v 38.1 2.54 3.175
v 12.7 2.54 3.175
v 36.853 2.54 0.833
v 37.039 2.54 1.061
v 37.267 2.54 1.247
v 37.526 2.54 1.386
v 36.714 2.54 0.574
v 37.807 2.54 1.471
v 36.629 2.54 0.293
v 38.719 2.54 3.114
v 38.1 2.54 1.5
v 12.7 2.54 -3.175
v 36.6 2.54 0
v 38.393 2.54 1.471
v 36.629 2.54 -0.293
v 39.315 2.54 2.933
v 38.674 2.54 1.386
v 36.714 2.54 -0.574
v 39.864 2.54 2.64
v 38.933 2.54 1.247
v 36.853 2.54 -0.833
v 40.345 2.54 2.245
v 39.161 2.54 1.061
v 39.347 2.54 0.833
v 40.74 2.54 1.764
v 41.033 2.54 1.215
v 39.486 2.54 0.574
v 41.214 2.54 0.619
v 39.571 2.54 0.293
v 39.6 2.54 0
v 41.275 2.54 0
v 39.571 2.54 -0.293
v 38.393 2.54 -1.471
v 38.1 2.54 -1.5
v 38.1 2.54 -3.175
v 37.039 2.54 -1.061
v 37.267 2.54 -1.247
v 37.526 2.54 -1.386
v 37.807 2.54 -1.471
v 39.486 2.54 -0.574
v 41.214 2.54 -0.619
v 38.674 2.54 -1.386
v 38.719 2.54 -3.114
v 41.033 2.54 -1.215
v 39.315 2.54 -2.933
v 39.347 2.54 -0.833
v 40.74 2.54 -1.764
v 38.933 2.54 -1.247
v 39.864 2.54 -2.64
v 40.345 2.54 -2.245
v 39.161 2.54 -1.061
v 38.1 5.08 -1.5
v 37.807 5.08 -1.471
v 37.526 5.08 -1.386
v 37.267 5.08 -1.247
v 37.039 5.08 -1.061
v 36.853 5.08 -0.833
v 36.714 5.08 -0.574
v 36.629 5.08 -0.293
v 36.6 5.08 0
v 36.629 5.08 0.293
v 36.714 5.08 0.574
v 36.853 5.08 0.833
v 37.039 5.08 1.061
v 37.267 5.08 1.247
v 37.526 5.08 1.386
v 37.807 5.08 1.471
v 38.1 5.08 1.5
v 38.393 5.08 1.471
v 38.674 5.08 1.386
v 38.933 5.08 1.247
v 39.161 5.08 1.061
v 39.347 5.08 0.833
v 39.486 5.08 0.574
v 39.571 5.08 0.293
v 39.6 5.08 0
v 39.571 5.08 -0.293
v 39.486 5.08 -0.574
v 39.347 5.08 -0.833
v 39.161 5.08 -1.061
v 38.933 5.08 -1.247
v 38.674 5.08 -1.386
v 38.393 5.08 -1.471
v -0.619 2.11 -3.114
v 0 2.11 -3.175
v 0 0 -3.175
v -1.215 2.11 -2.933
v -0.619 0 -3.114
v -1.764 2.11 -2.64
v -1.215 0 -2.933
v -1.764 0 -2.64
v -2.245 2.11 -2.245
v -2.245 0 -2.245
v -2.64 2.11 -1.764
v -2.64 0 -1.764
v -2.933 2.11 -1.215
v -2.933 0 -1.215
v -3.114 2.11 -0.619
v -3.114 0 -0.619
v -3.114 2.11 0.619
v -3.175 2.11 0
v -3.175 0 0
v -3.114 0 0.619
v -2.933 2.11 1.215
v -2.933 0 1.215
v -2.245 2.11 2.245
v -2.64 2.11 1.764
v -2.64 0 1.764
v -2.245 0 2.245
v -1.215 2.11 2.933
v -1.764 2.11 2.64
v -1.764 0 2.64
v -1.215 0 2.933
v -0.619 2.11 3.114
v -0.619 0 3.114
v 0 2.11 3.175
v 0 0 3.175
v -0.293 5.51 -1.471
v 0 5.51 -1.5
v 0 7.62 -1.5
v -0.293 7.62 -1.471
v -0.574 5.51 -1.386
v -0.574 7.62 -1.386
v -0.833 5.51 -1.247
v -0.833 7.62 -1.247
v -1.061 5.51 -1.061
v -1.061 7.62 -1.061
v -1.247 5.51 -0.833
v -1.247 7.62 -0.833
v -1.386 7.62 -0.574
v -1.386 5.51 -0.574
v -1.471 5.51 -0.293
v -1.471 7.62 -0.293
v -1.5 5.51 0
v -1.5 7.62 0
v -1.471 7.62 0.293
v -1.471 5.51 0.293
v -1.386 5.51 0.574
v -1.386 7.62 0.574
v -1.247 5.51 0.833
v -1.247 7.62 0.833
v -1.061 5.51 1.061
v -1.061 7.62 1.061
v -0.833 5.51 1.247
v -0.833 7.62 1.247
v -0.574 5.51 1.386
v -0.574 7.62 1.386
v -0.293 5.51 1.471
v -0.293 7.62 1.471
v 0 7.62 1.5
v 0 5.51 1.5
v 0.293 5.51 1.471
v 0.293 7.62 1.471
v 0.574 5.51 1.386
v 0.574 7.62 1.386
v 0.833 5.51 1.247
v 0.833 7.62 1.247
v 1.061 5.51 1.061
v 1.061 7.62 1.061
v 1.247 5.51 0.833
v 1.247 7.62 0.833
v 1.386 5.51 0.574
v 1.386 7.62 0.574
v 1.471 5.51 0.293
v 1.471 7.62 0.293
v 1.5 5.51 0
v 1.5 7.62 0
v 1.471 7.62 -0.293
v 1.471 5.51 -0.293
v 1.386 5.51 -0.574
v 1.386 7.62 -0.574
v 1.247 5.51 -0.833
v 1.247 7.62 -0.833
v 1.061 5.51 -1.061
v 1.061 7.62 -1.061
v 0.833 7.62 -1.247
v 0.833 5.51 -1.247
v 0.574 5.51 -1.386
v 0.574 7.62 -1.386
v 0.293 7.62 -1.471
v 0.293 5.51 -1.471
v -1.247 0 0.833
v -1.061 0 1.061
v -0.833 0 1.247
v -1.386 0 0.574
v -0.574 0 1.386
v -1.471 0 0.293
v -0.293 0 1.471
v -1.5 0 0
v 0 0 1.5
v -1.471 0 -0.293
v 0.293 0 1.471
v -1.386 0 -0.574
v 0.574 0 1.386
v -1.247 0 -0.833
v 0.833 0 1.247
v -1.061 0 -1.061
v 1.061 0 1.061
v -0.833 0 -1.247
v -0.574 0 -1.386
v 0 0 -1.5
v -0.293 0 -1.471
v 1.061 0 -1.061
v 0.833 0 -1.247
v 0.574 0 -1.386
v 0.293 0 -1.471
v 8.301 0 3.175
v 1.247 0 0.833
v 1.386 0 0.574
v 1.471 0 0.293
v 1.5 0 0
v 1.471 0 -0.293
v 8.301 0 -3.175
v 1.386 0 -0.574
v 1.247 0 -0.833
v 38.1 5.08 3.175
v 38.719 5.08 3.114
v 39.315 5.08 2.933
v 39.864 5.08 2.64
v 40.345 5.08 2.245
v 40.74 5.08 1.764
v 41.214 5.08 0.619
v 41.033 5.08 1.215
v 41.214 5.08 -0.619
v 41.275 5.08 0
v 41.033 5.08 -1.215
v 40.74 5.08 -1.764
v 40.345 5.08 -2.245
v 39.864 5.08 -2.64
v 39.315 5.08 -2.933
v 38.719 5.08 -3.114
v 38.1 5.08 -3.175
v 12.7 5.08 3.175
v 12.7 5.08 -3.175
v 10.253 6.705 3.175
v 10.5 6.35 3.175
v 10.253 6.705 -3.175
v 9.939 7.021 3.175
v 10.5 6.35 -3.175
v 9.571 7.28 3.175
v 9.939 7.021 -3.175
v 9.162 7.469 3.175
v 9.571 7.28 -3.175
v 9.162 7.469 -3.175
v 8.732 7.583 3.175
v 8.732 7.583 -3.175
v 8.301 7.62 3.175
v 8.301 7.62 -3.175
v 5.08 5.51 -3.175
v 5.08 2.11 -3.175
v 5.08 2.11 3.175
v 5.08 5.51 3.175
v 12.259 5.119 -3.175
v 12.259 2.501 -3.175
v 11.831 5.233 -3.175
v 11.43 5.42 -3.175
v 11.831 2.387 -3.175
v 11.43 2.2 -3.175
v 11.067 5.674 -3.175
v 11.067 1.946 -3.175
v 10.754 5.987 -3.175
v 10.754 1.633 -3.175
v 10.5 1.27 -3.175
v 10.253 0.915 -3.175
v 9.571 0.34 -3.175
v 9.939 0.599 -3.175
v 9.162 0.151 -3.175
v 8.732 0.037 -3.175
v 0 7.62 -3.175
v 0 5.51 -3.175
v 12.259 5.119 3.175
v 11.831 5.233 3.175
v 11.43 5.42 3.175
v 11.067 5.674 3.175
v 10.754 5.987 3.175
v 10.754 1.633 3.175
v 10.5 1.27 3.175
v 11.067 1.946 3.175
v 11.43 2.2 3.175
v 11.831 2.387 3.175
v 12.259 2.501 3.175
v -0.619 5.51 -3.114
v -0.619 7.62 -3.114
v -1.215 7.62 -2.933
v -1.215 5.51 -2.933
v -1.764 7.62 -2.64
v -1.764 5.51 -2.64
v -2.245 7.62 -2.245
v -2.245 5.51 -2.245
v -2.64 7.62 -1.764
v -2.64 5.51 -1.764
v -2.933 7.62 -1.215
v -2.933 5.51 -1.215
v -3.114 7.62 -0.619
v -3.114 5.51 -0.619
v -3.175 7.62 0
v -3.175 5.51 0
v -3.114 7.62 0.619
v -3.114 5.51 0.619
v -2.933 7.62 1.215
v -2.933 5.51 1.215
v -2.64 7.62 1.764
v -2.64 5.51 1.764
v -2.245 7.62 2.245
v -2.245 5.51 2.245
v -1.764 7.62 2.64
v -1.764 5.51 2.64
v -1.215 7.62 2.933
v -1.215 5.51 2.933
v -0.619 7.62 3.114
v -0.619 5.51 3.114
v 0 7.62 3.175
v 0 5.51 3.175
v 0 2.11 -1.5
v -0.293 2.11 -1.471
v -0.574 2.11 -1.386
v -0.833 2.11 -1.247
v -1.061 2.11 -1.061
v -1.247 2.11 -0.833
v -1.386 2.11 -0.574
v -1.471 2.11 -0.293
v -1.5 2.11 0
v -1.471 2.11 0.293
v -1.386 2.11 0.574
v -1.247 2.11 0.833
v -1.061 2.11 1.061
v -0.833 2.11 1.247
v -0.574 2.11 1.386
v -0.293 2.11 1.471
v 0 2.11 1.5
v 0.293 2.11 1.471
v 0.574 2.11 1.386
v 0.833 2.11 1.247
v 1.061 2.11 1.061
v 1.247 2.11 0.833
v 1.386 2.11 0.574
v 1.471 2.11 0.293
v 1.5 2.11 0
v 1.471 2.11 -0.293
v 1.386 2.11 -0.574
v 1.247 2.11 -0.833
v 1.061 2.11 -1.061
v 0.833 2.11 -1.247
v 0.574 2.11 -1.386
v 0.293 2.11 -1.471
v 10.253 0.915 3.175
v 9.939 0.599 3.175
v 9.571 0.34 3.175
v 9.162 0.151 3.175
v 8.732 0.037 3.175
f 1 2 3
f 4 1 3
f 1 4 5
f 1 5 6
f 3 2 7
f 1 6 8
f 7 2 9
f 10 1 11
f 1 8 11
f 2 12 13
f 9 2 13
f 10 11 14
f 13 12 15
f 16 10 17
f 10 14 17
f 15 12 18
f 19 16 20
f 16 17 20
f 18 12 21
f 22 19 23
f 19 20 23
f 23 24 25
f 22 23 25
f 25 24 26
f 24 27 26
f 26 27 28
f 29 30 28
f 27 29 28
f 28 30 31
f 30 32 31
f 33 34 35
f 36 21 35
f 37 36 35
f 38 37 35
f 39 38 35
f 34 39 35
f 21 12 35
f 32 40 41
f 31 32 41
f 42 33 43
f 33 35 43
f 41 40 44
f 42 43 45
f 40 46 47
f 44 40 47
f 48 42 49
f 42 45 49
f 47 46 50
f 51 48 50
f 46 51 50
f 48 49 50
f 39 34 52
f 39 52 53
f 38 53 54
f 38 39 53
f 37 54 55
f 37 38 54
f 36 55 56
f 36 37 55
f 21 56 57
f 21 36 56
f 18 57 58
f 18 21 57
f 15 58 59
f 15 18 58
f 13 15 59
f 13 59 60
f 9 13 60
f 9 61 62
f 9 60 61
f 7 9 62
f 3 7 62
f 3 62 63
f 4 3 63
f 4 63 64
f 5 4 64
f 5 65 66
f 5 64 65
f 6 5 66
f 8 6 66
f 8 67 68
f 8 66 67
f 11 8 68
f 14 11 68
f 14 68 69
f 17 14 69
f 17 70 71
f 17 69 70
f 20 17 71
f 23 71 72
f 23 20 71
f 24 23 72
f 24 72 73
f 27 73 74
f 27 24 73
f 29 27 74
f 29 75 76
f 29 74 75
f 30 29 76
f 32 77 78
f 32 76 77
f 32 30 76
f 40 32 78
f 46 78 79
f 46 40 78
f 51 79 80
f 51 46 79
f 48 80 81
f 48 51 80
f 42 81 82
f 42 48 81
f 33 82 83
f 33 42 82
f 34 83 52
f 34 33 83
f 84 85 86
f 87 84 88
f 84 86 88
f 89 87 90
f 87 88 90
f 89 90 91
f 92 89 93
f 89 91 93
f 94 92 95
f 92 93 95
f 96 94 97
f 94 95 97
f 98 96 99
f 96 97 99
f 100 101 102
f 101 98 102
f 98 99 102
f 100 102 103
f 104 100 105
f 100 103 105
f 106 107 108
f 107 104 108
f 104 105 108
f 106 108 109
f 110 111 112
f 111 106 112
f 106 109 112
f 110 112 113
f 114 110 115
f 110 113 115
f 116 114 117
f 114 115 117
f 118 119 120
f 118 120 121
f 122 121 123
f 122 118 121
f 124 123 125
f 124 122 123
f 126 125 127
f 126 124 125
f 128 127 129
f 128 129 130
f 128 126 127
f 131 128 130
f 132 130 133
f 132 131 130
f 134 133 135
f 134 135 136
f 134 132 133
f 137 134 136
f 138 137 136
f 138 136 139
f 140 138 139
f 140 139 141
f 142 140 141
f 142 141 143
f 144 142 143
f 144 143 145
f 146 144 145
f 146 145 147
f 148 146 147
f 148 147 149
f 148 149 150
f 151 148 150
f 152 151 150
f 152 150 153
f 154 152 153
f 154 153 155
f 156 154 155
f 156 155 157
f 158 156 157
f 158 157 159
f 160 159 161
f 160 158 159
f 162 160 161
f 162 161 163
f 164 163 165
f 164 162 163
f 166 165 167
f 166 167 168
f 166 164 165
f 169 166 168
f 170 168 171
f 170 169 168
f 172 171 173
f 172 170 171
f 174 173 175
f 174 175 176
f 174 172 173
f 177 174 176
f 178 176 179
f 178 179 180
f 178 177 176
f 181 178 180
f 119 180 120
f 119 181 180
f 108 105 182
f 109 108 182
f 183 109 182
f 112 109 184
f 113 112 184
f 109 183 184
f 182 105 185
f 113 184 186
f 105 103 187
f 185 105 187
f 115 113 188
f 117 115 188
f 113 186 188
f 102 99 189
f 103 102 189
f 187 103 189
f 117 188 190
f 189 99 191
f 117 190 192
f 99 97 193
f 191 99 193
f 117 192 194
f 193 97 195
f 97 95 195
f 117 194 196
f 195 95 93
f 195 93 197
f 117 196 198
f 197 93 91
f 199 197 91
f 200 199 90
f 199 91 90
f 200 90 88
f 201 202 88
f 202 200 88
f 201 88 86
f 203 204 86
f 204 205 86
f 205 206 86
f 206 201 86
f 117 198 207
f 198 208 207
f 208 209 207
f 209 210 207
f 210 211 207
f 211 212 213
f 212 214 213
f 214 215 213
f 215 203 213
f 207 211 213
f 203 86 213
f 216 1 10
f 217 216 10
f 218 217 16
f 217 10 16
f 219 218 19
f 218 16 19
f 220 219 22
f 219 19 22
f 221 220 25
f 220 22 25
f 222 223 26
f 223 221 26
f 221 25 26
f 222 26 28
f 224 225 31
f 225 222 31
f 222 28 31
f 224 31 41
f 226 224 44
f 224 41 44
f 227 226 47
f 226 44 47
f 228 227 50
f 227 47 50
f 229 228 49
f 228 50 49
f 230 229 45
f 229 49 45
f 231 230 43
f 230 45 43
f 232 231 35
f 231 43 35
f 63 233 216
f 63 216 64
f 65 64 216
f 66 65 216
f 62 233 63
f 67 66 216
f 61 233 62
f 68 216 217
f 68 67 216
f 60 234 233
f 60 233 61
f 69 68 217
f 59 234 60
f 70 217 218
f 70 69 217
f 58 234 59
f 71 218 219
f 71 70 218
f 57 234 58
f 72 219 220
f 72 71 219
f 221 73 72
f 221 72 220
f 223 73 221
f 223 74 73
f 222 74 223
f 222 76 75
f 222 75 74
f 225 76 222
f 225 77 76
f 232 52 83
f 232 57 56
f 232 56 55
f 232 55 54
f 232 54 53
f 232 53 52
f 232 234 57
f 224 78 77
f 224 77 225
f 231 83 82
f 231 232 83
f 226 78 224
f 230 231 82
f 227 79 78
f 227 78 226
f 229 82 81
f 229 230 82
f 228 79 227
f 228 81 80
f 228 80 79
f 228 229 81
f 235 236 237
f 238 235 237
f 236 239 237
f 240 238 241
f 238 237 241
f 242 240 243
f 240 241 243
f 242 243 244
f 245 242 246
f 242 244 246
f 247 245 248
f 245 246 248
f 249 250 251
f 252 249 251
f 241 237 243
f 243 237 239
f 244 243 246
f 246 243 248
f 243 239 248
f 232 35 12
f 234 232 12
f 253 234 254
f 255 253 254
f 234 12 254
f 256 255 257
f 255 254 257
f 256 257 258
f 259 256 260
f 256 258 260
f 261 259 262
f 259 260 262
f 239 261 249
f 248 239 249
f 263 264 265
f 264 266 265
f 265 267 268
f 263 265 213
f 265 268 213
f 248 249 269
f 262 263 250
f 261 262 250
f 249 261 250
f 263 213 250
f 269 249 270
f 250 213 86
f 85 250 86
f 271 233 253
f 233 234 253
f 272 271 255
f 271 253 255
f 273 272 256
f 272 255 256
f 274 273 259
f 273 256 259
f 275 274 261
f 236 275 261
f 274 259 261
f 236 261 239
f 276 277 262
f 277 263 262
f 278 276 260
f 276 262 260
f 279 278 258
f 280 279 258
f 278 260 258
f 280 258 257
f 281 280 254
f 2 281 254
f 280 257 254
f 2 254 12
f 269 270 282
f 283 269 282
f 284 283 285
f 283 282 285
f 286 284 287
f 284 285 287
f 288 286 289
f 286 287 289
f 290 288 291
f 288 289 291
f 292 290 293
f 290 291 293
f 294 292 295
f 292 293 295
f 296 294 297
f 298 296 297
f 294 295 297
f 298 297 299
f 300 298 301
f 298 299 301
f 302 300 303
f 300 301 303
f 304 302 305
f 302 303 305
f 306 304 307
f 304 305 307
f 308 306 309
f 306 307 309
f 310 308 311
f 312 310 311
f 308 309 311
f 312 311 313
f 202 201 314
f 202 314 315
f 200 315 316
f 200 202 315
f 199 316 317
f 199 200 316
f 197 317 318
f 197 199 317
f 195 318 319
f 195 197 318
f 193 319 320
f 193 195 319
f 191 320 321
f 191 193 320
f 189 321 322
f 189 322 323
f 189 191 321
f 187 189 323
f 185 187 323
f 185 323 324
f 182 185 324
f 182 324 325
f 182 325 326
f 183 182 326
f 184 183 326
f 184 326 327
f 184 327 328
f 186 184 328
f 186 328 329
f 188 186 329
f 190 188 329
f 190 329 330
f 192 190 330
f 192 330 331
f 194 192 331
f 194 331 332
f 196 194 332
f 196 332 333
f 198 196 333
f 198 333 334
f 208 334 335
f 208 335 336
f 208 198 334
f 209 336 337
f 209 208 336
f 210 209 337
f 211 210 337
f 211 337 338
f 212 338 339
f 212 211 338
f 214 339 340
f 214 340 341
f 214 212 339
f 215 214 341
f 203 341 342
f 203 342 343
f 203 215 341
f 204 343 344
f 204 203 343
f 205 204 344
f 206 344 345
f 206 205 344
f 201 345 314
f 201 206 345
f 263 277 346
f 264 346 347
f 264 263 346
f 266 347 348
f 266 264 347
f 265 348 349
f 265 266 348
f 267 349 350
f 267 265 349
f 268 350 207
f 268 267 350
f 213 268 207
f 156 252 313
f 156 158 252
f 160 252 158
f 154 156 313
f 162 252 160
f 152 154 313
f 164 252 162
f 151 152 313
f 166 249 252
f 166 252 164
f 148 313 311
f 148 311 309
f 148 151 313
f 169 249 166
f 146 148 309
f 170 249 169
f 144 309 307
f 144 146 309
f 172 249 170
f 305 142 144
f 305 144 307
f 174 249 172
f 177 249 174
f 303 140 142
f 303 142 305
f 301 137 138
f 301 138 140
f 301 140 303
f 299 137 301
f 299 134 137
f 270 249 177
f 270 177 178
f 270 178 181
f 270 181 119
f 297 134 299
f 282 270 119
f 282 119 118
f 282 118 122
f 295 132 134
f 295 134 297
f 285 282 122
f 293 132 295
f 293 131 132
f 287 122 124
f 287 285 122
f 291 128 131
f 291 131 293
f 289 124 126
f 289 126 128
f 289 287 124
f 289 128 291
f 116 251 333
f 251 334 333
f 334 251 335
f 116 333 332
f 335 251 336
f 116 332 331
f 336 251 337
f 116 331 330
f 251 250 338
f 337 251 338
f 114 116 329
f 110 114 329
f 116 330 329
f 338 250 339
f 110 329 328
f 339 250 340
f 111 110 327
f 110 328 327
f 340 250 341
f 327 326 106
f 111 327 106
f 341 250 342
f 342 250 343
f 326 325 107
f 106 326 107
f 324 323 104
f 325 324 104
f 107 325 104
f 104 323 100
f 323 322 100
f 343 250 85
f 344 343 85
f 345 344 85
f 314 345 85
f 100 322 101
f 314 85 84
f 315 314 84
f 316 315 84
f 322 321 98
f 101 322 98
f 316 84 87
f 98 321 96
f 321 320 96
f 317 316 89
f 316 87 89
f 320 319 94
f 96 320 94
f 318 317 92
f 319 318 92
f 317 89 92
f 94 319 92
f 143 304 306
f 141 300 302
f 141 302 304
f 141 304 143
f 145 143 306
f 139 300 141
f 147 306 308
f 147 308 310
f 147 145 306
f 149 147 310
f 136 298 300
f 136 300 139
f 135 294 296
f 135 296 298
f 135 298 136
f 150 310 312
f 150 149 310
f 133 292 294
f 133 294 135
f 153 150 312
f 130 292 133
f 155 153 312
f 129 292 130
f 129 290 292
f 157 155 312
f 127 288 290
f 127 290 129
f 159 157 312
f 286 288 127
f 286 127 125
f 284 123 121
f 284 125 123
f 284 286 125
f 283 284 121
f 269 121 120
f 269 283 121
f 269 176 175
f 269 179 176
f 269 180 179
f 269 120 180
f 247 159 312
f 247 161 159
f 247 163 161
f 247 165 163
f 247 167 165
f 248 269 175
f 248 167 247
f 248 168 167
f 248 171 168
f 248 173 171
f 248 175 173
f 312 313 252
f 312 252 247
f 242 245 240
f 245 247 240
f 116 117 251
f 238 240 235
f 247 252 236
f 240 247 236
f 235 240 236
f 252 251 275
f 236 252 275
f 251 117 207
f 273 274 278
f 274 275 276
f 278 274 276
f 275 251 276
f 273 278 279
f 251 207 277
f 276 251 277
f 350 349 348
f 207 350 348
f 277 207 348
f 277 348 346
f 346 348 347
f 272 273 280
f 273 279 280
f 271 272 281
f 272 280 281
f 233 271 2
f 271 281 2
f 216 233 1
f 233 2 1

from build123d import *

# Parameters (mm, degrees)
SKETCH1_R               = 1.5
BOSS_EXTRUDE1_DEPTH     = 7.62
CUT_EXTRUDE1_DEPTH      = 1.7
CUT_EXTRUDE1_DEPTH_BACK = 1.7
SKETCH2_R               = 1.5
SKETCH3_W               = 34.821950375
SKETCH3_H               = 10.205546921
CUT_EXTRUDE2_DEPTH      = 2.54
FILLET1_R               = 2.54
FILLET2_R               = 2.54


with BuildPart() as part:
    # Sketch1 → Boss-Extrude1 (new body)
    with BuildSketch(Plane(origin=(0, 0, 0), x_dir=(1, 0, 0), z_dir=(0, 1, 0))):
        with BuildLine():
            ThreePointArc((0, 3.175), (-3.175, 0), (0, -3.175))
            Line((0, -3.175), (38.1, -3.175))
            ThreePointArc((38.1, -3.175), (41.275, 0), (38.1, 3.175))
            Line((38.1, 3.175), (0, 3.175))
        make_face()
        with Locations(Location((0, 0, 0), (0, 0, 90))):
            Circle(SKETCH1_R, mode=Mode.SUBTRACT)
        with Locations(Location((38.1, 0, 0), (0, 0, 90))):
            Circle(SKETCH1_R, mode=Mode.SUBTRACT)
    extrude(amount=BOSS_EXTRUDE1_DEPTH)

    # Sketch2 → Cut-Extrude1 (cut, two sides: drawn at the far end of the back side and taken through both)
    with BuildSketch(Plane(origin=(0, 3.81, 0), x_dir=(1, 0, 0), z_dir=(0, 1, 0)).offset(-CUT_EXTRUDE1_DEPTH_BACK)):
        with BuildLine():
            Line((0, 3.175), (5.08, 3.175))
            Line((5.08, 3.175), (5.08, -3.175))
            Line((5.08, -3.175), (0, -3.175))
            ThreePointArc((0, -3.175), (-3.175, 0), (0, 3.175))
        make_face()
        with Locations(Location((0, 0, 0), (0, 0, 90))):
            Circle(SKETCH2_R, mode=Mode.SUBTRACT)
    extrude(amount=CUT_EXTRUDE1_DEPTH + CUT_EXTRUDE1_DEPTH_BACK, mode=Mode.SUBTRACT)

    # Sketch3 → Cut-Extrude2 (cut)
    with BuildSketch(Plane(origin=(0, 7.62, 0), x_dir=(1, 0, 0), z_dir=(0, 1, 0))):
        with Locations((27.570975188, -1.92777346)):
            Rectangle(SKETCH3_W, SKETCH3_H)
    cut_extrude2 = extrude(amount=-CUT_EXTRUDE2_DEPTH, mode=Mode.SUBTRACT)

    # Mirror1: Cut-Extrude2 across plane
    add(cut_extrude2.mirror(Plane.ZX.offset(3.81)), mode=Mode.SUBTRACT)

    # Fillet1
    fillet1_edges = [part.edges().sort_by_distance(p)[0] for p in [
        (10.16, 5.08, 0),
        (10.16, 2.54, 0),
    ]]
    fillet(fillet1_edges, radius=FILLET1_R - 0.0001)  # a hair under: the kernel refuses the full size

    # Fillet2
    fillet2_edges = [part.edges().sort_by_distance(p)[0] for p in [
        (10.16, 7.62, 0),
        (10.16, 0, 0),
    ]]
    fillet(fillet2_edges, radius=FILLET2_R)


solid = part.part
